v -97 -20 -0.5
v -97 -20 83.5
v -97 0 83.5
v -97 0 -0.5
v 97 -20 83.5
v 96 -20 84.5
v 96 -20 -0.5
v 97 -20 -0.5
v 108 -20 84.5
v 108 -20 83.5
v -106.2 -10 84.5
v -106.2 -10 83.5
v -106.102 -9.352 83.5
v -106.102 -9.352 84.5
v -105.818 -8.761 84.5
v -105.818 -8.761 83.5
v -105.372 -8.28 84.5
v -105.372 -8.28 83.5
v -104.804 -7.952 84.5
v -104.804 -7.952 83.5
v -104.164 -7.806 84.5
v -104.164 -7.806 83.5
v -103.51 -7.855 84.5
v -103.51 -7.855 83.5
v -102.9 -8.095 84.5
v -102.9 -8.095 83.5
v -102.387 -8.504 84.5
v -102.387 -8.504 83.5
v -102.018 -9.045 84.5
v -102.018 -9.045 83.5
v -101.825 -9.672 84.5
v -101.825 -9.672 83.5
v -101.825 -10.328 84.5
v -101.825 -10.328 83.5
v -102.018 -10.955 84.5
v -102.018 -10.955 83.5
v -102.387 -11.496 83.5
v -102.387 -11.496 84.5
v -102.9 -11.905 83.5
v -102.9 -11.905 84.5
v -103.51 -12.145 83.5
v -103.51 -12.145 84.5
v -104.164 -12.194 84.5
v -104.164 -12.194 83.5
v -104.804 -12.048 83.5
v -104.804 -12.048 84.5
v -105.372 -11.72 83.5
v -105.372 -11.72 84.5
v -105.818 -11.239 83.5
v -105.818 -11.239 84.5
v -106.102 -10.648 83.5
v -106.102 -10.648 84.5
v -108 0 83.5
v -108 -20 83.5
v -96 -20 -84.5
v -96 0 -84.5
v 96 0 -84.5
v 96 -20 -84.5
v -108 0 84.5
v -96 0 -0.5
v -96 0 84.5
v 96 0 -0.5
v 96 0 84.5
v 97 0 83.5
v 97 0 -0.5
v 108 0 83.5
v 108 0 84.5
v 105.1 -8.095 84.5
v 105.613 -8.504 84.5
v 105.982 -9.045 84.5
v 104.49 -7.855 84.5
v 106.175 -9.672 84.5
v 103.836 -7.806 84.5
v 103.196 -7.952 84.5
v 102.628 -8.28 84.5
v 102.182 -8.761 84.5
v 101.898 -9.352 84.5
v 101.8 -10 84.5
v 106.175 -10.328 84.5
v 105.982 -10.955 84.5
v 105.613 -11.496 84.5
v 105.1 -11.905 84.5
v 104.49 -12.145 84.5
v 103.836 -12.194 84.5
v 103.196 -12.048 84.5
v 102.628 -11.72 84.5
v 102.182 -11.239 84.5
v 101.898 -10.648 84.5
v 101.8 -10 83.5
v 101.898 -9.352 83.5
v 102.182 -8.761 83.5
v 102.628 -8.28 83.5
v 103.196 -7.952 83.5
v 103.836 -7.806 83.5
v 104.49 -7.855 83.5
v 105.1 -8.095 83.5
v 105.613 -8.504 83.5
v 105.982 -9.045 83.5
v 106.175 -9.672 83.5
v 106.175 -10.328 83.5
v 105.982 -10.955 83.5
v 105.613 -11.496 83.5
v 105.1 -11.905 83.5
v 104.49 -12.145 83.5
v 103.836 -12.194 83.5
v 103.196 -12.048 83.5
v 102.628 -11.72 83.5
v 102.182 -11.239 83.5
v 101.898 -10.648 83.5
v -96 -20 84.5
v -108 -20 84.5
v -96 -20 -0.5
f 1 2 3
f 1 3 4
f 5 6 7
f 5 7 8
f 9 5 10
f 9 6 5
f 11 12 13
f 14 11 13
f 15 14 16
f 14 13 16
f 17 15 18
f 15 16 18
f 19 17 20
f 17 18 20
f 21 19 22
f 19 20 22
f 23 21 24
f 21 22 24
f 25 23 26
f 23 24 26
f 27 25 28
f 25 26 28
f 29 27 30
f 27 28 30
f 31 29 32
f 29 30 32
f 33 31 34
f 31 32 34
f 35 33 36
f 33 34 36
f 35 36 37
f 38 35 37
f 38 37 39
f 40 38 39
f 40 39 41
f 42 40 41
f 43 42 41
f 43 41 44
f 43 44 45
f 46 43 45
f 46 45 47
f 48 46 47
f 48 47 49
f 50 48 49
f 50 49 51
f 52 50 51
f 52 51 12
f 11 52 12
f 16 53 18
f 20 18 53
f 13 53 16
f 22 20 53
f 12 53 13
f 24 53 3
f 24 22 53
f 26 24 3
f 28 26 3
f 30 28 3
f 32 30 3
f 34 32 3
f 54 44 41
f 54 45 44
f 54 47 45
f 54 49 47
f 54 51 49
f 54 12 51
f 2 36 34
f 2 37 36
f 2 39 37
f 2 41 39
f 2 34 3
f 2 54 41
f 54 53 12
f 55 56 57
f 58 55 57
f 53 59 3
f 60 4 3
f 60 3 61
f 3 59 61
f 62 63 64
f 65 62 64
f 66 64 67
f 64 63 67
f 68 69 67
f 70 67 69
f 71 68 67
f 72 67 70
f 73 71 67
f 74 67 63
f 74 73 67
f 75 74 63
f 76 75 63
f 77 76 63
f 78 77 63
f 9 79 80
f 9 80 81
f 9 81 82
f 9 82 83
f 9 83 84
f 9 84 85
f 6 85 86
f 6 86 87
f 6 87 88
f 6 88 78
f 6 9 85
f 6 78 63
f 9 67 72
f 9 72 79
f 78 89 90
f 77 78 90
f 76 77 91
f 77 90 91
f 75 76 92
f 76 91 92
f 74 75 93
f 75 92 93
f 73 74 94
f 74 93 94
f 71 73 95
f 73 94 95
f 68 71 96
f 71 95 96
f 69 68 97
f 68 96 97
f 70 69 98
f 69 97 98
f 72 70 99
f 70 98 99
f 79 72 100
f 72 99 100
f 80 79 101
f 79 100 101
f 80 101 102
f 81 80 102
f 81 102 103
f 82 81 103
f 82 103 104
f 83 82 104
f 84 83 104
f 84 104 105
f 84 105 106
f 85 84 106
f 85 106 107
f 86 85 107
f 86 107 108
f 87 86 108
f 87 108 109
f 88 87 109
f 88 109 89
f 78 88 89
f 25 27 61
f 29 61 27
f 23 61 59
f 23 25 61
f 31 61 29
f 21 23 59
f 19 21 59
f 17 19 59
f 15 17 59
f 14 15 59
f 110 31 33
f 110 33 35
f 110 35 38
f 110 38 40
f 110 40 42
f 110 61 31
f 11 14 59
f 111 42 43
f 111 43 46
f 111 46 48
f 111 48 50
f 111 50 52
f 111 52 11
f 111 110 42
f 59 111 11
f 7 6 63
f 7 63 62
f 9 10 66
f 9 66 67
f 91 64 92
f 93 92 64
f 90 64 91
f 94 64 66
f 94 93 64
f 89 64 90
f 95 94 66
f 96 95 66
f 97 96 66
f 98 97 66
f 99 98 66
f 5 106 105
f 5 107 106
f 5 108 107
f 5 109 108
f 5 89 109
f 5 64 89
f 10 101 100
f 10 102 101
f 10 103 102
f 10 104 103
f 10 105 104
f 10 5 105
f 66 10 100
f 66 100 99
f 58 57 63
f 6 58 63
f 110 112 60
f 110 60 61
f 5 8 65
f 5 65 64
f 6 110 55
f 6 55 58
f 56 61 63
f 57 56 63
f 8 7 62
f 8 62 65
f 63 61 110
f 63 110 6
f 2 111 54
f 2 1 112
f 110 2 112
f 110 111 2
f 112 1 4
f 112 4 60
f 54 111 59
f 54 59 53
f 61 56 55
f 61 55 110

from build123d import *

# Parameters (mm, degrees)
F0_W       = 192
F0_H       = 169
F1_DEPTH   = 20
F3_DEPTH   = 20
F5_D       = 4.4
F5_DEPTH   = 12
F5_TIP     = 1.3218933619
F5_2_D     = 4.4
F5_2_DEPTH = 12
F5_2_TIP   = 1.3218933619


with BuildPart() as f1:
    # F0 (on Front) → F1 (new body)
    with BuildSketch(Plane.XZ):
        Rectangle(F0_W, F0_H)
    extrude(amount=F1_DEPTH)


with BuildPart() as f3:
    # F2 (on face) → F3 (new body)
    with BuildSketch(Plane.XZ.offset(20)):
        Polygon((-96, -0.5), (-96, 84.5), (-97, 84.5), (-108, 84.5), (-108, 83.5), (-97, 83.5), (-97, -0.5), align=None)
    extrude(amount=-F3_DEPTH)

    # F5
    with Locations(Plane.XY.offset(84.5)):
        with Locations((-104, -10), (104, -10)):
            Hole(F5_D / 2, depth=F5_DEPTH)
            with Locations((0, 0, -(F5_DEPTH + F5_TIP / 2))):  # 118° drill point
                Cone(0, F5_D / 2, F5_TIP, mode=Mode.SUBTRACT)


with BuildPart() as f3b:
    # F2 (on face) → F3, piece 2 (new body)
    with BuildSketch(Plane.XZ.offset(20)):
        Polygon((108, 83.5), (108, 84.5), (97, 84.5), (96, 84.5), (96, -0.5), (97, -0.5), (97, 83.5), align=None)
    extrude(amount=-F3_DEPTH)

    # F5#2
    with Locations(Plane.XY.offset(84.5)):
        with Locations((-104, -10), (104, -10)):
            Hole(F5_2_D / 2, depth=F5_2_DEPTH)
            with Locations((0, 0, -(F5_2_DEPTH + F5_2_TIP / 2))):  # 118° drill point
                Cone(0, F5_2_D / 2, F5_2_TIP, mode=Mode.SUBTRACT)


solid = Compound([f1.part, f3.part, f3b.part])
